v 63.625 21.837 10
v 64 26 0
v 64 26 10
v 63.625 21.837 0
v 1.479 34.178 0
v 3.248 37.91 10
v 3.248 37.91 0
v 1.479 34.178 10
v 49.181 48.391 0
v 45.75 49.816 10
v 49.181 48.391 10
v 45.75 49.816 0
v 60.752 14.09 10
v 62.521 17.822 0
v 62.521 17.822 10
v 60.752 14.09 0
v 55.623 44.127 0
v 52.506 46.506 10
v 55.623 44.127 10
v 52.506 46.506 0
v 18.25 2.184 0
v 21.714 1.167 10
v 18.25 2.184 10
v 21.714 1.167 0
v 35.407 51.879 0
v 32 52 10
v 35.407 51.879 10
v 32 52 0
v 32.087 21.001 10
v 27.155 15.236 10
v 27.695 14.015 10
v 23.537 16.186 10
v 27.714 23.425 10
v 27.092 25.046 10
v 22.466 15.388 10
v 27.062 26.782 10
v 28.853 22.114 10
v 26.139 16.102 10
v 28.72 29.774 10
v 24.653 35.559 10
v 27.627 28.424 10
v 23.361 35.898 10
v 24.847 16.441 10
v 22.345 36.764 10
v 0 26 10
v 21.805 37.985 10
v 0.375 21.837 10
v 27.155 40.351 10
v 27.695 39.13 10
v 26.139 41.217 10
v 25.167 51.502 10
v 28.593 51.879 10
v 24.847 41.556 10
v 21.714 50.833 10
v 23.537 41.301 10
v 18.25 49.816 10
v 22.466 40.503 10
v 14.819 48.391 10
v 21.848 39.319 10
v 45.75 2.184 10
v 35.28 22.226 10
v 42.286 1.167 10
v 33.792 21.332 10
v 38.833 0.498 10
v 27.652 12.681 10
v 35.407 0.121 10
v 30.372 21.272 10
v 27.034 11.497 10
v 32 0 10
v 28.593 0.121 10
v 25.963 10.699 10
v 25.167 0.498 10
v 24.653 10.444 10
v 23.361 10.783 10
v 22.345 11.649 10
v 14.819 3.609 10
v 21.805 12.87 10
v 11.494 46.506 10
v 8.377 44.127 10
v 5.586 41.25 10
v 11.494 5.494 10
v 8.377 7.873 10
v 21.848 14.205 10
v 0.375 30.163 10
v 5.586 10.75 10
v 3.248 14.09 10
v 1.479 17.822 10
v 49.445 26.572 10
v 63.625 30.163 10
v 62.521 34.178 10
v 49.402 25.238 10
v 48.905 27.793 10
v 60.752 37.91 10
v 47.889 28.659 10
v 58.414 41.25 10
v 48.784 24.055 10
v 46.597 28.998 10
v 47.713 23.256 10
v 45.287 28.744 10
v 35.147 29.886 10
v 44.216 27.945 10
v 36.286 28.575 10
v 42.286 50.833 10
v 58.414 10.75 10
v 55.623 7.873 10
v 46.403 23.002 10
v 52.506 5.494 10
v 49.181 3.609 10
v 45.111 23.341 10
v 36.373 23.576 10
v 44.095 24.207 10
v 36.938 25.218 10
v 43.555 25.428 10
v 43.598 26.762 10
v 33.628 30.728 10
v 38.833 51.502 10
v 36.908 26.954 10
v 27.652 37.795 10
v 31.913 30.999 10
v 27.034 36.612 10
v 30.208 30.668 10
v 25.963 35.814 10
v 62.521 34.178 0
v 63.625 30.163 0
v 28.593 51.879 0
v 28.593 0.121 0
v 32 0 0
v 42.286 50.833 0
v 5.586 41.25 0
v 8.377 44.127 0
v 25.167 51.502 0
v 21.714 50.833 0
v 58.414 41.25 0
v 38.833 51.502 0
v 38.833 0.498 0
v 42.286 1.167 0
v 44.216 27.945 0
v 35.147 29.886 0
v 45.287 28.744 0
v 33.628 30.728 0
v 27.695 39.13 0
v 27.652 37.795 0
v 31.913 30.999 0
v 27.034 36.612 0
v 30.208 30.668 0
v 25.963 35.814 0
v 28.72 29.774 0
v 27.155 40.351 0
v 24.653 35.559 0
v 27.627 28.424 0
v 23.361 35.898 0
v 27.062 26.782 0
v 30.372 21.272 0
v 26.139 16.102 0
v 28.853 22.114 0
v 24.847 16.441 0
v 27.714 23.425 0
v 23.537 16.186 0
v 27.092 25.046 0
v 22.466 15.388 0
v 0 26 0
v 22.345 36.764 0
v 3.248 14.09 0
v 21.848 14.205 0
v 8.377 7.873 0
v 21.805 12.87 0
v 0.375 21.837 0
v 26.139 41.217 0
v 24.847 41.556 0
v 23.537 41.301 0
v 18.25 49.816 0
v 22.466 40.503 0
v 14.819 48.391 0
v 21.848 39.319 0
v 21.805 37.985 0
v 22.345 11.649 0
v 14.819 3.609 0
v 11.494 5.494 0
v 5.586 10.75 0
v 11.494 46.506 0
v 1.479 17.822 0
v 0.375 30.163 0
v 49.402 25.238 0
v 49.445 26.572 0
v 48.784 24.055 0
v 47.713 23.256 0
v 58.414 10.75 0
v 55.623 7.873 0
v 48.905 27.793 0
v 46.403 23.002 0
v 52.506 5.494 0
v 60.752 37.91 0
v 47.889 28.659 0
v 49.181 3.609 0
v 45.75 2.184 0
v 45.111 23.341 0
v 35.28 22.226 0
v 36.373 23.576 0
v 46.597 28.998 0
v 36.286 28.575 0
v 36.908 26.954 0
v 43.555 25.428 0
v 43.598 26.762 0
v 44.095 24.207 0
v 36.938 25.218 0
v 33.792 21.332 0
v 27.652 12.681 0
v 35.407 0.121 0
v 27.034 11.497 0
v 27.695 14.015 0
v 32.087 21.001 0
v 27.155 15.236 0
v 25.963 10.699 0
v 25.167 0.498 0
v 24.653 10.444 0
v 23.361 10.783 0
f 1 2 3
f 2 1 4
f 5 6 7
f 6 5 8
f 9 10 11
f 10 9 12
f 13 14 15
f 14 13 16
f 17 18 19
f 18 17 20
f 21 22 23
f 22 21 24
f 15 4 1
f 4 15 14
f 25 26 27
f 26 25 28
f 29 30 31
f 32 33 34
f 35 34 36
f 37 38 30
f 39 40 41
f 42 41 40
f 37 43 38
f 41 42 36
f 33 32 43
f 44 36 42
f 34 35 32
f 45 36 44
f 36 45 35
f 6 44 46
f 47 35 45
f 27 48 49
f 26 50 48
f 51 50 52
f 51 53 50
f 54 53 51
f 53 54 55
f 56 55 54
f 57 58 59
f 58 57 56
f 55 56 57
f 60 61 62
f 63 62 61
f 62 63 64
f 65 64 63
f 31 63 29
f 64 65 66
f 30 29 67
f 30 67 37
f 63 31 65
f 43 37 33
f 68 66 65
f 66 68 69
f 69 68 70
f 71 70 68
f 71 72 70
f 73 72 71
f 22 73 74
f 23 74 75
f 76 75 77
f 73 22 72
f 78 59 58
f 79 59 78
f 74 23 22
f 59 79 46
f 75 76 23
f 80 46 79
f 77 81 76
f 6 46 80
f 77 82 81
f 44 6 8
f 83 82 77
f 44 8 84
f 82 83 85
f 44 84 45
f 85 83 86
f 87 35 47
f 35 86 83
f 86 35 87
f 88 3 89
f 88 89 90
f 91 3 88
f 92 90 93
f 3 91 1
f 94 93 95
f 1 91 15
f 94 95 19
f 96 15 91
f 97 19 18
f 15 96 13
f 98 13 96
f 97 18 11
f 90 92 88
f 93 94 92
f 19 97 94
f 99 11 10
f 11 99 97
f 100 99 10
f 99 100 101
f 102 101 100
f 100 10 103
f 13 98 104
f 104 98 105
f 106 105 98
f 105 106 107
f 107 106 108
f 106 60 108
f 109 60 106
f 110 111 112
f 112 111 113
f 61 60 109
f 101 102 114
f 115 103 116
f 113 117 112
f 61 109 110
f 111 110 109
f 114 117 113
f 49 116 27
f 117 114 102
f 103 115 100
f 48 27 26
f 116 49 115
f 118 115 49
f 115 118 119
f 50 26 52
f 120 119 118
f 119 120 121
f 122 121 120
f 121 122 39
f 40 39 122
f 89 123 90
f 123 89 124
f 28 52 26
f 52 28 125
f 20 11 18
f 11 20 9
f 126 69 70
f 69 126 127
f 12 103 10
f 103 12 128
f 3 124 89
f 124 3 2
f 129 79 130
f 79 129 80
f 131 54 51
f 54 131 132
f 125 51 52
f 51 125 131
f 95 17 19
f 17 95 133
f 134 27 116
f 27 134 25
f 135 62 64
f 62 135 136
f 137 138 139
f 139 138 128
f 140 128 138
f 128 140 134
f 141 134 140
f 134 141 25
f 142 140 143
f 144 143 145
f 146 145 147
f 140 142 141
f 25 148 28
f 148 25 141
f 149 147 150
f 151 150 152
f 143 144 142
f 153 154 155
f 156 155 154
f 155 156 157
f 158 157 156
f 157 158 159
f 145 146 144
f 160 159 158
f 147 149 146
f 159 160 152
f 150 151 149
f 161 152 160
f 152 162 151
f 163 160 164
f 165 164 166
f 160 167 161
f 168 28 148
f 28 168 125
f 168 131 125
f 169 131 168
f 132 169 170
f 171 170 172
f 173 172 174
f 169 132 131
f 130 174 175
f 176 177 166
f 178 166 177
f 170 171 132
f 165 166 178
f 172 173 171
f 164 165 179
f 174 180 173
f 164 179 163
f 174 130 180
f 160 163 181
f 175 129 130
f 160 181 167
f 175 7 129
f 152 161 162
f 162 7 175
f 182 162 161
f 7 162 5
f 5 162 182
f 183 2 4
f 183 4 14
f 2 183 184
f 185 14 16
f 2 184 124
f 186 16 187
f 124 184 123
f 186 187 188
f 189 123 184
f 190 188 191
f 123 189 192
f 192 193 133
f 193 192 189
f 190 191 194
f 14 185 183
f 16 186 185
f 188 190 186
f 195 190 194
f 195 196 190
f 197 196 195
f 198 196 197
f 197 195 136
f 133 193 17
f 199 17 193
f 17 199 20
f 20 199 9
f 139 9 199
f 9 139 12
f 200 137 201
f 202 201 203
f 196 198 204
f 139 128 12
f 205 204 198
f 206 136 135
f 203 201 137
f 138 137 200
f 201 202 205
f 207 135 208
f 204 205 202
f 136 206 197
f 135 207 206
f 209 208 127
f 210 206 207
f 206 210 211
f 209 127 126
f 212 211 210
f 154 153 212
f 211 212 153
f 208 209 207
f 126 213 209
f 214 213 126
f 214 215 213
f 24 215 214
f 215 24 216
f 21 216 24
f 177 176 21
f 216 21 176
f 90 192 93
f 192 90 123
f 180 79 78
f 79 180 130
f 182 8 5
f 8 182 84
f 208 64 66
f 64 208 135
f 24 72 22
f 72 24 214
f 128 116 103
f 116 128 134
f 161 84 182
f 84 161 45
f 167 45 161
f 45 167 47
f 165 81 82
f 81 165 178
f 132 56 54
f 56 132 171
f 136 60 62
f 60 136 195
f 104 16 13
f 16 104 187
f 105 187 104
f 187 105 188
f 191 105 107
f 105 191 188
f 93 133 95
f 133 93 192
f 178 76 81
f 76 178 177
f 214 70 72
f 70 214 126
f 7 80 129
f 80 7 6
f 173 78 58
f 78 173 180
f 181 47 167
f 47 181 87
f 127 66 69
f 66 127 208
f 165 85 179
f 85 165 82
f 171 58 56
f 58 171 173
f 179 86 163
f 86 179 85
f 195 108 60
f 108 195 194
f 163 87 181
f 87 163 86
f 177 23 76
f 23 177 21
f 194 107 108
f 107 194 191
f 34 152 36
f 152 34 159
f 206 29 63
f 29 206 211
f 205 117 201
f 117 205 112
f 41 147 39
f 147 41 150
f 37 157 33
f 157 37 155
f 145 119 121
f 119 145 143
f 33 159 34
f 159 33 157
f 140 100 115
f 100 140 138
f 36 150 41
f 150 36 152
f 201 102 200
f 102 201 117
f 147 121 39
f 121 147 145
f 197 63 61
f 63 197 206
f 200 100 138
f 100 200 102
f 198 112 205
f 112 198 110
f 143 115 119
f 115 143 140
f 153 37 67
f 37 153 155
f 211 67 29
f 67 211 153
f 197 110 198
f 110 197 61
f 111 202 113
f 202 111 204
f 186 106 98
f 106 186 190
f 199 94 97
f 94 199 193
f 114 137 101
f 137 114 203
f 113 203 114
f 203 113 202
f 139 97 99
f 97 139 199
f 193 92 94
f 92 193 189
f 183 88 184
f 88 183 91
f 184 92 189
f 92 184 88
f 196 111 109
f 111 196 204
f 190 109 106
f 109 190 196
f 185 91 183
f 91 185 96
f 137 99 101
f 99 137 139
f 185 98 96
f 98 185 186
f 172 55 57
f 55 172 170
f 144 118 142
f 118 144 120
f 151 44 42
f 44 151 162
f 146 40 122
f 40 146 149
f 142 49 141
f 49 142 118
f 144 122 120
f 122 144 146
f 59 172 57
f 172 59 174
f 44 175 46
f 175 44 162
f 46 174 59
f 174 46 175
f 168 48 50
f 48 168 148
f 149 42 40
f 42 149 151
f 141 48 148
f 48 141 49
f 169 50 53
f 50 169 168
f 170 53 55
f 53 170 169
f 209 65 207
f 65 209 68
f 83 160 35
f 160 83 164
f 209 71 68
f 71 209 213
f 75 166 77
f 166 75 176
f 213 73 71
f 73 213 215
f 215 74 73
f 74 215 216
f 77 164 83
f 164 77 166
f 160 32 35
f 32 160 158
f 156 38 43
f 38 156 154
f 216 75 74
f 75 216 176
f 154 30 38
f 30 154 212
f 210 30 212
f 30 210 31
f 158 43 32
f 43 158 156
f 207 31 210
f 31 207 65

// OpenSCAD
$fn = 32;

// ----------------------------------------------------------------------
// Cam plate: double_lobe cam, base R24
// ----------------------------------------------------------------------

// --- parameters (mm) ---
base_r = 24;              // base circle radius
lobe_h = 8;               // cam lobe rise
bore_r = 5;               // shaft bore radius
plate_t = 10;             // plate thickness, Z (extrusion height)
ring_r = 14.5;            // lightening ring radius
bolt_r = 3;               // lightening hole radius

profile = [[64, 26], [63.625, 30.163], [62.521, 34.178], [60.752, 37.91], [58.414, 41.25], [55.623, 44.127], [52.506, 46.506], [49.181, 48.391], [45.75, 49.816], [42.286, 50.833], [38.833, 51.502], [35.407, 51.879], [32, 52], [28.593, 51.879], [25.167, 51.502], [21.714, 50.833], [18.25, 49.816], [14.819, 48.391], [11.494, 46.506], [8.377, 44.127], [5.586, 41.25], [3.248, 37.91], [1.479, 34.178], [0.375, 30.163], [0, 26], [0.375, 21.837], [1.479, 17.822], [3.248, 14.09], [5.586, 10.75], [8.377, 7.873], [11.494, 5.494], [14.819, 3.609], [18.25, 2.184], [21.714, 1.167], [25.167, 0.498], [28.593, 0.121], [32, 0], [35.407, 0.121], [38.833, 0.498], [42.286, 1.167], [45.75, 2.184], [49.181, 3.609], [52.506, 5.494], [55.623, 7.873], [58.414, 10.75], [60.752, 14.09], [62.521, 17.822], [63.625, 21.837]];  // primary outline, 48 points, counter clockwise
void_1 = [[36.908, 26.954], [36.286, 28.575], [35.147, 29.886], [33.628, 30.728], [31.913, 30.999], [30.208, 30.668], [28.72, 29.774], [27.627, 28.424], [27.062, 26.782], [27.092, 25.046], [27.714, 23.425], [28.853, 22.114], [30.372, 21.272], [32.087, 21.001], [33.792, 21.332], [35.28, 22.226], [36.373, 23.576], [36.938, 25.218]];  // shaft bore, 18 points
void_2 = [[49.445, 26.572], [48.905, 27.793], [47.889, 28.659], [46.597, 28.998], [45.287, 28.744], [44.216, 27.945], [43.598, 26.762], [43.555, 25.428], [44.095, 24.207], [45.111, 23.341], [46.403, 23.002], [47.713, 23.256], [48.784, 24.055], [49.402, 25.238]];  // lightening hole 1, 14 points
void_3 = [[27.695, 39.13], [27.155, 40.351], [26.139, 41.217], [24.847, 41.556], [23.537, 41.301], [22.466, 40.503], [21.848, 39.319], [21.805, 37.985], [22.345, 36.764], [23.361, 35.898], [24.653, 35.559], [25.963, 35.814], [27.034, 36.612], [27.652, 37.795]];  // lightening hole 2, 14 points
void_4 = [[27.695, 14.015], [27.155, 15.236], [26.139, 16.102], [24.847, 16.441], [23.537, 16.186], [22.466, 15.388], [21.848, 14.205], [21.805, 12.87], [22.345, 11.649], [23.361, 10.783], [24.653, 10.444], [25.963, 10.699], [27.034, 11.497], [27.652, 12.681]];  // lightening hole 3, 14 points

// --- the one profile operation ---
difference() {
  linear_extrude(height = plate_t) polygon(points = profile);
  translate([0, 0, -1])
    linear_extrude(height = plate_t + 2) polygon(points = void_1);
  translate([0, 0, -1])
    linear_extrude(height = plate_t + 2) polygon(points = void_2);
  translate([0, 0, -1])
    linear_extrude(height = plate_t + 2) polygon(points = void_3);
  translate([0, 0, -1])
    linear_extrude(height = plate_t + 2) polygon(points = void_4);
}
